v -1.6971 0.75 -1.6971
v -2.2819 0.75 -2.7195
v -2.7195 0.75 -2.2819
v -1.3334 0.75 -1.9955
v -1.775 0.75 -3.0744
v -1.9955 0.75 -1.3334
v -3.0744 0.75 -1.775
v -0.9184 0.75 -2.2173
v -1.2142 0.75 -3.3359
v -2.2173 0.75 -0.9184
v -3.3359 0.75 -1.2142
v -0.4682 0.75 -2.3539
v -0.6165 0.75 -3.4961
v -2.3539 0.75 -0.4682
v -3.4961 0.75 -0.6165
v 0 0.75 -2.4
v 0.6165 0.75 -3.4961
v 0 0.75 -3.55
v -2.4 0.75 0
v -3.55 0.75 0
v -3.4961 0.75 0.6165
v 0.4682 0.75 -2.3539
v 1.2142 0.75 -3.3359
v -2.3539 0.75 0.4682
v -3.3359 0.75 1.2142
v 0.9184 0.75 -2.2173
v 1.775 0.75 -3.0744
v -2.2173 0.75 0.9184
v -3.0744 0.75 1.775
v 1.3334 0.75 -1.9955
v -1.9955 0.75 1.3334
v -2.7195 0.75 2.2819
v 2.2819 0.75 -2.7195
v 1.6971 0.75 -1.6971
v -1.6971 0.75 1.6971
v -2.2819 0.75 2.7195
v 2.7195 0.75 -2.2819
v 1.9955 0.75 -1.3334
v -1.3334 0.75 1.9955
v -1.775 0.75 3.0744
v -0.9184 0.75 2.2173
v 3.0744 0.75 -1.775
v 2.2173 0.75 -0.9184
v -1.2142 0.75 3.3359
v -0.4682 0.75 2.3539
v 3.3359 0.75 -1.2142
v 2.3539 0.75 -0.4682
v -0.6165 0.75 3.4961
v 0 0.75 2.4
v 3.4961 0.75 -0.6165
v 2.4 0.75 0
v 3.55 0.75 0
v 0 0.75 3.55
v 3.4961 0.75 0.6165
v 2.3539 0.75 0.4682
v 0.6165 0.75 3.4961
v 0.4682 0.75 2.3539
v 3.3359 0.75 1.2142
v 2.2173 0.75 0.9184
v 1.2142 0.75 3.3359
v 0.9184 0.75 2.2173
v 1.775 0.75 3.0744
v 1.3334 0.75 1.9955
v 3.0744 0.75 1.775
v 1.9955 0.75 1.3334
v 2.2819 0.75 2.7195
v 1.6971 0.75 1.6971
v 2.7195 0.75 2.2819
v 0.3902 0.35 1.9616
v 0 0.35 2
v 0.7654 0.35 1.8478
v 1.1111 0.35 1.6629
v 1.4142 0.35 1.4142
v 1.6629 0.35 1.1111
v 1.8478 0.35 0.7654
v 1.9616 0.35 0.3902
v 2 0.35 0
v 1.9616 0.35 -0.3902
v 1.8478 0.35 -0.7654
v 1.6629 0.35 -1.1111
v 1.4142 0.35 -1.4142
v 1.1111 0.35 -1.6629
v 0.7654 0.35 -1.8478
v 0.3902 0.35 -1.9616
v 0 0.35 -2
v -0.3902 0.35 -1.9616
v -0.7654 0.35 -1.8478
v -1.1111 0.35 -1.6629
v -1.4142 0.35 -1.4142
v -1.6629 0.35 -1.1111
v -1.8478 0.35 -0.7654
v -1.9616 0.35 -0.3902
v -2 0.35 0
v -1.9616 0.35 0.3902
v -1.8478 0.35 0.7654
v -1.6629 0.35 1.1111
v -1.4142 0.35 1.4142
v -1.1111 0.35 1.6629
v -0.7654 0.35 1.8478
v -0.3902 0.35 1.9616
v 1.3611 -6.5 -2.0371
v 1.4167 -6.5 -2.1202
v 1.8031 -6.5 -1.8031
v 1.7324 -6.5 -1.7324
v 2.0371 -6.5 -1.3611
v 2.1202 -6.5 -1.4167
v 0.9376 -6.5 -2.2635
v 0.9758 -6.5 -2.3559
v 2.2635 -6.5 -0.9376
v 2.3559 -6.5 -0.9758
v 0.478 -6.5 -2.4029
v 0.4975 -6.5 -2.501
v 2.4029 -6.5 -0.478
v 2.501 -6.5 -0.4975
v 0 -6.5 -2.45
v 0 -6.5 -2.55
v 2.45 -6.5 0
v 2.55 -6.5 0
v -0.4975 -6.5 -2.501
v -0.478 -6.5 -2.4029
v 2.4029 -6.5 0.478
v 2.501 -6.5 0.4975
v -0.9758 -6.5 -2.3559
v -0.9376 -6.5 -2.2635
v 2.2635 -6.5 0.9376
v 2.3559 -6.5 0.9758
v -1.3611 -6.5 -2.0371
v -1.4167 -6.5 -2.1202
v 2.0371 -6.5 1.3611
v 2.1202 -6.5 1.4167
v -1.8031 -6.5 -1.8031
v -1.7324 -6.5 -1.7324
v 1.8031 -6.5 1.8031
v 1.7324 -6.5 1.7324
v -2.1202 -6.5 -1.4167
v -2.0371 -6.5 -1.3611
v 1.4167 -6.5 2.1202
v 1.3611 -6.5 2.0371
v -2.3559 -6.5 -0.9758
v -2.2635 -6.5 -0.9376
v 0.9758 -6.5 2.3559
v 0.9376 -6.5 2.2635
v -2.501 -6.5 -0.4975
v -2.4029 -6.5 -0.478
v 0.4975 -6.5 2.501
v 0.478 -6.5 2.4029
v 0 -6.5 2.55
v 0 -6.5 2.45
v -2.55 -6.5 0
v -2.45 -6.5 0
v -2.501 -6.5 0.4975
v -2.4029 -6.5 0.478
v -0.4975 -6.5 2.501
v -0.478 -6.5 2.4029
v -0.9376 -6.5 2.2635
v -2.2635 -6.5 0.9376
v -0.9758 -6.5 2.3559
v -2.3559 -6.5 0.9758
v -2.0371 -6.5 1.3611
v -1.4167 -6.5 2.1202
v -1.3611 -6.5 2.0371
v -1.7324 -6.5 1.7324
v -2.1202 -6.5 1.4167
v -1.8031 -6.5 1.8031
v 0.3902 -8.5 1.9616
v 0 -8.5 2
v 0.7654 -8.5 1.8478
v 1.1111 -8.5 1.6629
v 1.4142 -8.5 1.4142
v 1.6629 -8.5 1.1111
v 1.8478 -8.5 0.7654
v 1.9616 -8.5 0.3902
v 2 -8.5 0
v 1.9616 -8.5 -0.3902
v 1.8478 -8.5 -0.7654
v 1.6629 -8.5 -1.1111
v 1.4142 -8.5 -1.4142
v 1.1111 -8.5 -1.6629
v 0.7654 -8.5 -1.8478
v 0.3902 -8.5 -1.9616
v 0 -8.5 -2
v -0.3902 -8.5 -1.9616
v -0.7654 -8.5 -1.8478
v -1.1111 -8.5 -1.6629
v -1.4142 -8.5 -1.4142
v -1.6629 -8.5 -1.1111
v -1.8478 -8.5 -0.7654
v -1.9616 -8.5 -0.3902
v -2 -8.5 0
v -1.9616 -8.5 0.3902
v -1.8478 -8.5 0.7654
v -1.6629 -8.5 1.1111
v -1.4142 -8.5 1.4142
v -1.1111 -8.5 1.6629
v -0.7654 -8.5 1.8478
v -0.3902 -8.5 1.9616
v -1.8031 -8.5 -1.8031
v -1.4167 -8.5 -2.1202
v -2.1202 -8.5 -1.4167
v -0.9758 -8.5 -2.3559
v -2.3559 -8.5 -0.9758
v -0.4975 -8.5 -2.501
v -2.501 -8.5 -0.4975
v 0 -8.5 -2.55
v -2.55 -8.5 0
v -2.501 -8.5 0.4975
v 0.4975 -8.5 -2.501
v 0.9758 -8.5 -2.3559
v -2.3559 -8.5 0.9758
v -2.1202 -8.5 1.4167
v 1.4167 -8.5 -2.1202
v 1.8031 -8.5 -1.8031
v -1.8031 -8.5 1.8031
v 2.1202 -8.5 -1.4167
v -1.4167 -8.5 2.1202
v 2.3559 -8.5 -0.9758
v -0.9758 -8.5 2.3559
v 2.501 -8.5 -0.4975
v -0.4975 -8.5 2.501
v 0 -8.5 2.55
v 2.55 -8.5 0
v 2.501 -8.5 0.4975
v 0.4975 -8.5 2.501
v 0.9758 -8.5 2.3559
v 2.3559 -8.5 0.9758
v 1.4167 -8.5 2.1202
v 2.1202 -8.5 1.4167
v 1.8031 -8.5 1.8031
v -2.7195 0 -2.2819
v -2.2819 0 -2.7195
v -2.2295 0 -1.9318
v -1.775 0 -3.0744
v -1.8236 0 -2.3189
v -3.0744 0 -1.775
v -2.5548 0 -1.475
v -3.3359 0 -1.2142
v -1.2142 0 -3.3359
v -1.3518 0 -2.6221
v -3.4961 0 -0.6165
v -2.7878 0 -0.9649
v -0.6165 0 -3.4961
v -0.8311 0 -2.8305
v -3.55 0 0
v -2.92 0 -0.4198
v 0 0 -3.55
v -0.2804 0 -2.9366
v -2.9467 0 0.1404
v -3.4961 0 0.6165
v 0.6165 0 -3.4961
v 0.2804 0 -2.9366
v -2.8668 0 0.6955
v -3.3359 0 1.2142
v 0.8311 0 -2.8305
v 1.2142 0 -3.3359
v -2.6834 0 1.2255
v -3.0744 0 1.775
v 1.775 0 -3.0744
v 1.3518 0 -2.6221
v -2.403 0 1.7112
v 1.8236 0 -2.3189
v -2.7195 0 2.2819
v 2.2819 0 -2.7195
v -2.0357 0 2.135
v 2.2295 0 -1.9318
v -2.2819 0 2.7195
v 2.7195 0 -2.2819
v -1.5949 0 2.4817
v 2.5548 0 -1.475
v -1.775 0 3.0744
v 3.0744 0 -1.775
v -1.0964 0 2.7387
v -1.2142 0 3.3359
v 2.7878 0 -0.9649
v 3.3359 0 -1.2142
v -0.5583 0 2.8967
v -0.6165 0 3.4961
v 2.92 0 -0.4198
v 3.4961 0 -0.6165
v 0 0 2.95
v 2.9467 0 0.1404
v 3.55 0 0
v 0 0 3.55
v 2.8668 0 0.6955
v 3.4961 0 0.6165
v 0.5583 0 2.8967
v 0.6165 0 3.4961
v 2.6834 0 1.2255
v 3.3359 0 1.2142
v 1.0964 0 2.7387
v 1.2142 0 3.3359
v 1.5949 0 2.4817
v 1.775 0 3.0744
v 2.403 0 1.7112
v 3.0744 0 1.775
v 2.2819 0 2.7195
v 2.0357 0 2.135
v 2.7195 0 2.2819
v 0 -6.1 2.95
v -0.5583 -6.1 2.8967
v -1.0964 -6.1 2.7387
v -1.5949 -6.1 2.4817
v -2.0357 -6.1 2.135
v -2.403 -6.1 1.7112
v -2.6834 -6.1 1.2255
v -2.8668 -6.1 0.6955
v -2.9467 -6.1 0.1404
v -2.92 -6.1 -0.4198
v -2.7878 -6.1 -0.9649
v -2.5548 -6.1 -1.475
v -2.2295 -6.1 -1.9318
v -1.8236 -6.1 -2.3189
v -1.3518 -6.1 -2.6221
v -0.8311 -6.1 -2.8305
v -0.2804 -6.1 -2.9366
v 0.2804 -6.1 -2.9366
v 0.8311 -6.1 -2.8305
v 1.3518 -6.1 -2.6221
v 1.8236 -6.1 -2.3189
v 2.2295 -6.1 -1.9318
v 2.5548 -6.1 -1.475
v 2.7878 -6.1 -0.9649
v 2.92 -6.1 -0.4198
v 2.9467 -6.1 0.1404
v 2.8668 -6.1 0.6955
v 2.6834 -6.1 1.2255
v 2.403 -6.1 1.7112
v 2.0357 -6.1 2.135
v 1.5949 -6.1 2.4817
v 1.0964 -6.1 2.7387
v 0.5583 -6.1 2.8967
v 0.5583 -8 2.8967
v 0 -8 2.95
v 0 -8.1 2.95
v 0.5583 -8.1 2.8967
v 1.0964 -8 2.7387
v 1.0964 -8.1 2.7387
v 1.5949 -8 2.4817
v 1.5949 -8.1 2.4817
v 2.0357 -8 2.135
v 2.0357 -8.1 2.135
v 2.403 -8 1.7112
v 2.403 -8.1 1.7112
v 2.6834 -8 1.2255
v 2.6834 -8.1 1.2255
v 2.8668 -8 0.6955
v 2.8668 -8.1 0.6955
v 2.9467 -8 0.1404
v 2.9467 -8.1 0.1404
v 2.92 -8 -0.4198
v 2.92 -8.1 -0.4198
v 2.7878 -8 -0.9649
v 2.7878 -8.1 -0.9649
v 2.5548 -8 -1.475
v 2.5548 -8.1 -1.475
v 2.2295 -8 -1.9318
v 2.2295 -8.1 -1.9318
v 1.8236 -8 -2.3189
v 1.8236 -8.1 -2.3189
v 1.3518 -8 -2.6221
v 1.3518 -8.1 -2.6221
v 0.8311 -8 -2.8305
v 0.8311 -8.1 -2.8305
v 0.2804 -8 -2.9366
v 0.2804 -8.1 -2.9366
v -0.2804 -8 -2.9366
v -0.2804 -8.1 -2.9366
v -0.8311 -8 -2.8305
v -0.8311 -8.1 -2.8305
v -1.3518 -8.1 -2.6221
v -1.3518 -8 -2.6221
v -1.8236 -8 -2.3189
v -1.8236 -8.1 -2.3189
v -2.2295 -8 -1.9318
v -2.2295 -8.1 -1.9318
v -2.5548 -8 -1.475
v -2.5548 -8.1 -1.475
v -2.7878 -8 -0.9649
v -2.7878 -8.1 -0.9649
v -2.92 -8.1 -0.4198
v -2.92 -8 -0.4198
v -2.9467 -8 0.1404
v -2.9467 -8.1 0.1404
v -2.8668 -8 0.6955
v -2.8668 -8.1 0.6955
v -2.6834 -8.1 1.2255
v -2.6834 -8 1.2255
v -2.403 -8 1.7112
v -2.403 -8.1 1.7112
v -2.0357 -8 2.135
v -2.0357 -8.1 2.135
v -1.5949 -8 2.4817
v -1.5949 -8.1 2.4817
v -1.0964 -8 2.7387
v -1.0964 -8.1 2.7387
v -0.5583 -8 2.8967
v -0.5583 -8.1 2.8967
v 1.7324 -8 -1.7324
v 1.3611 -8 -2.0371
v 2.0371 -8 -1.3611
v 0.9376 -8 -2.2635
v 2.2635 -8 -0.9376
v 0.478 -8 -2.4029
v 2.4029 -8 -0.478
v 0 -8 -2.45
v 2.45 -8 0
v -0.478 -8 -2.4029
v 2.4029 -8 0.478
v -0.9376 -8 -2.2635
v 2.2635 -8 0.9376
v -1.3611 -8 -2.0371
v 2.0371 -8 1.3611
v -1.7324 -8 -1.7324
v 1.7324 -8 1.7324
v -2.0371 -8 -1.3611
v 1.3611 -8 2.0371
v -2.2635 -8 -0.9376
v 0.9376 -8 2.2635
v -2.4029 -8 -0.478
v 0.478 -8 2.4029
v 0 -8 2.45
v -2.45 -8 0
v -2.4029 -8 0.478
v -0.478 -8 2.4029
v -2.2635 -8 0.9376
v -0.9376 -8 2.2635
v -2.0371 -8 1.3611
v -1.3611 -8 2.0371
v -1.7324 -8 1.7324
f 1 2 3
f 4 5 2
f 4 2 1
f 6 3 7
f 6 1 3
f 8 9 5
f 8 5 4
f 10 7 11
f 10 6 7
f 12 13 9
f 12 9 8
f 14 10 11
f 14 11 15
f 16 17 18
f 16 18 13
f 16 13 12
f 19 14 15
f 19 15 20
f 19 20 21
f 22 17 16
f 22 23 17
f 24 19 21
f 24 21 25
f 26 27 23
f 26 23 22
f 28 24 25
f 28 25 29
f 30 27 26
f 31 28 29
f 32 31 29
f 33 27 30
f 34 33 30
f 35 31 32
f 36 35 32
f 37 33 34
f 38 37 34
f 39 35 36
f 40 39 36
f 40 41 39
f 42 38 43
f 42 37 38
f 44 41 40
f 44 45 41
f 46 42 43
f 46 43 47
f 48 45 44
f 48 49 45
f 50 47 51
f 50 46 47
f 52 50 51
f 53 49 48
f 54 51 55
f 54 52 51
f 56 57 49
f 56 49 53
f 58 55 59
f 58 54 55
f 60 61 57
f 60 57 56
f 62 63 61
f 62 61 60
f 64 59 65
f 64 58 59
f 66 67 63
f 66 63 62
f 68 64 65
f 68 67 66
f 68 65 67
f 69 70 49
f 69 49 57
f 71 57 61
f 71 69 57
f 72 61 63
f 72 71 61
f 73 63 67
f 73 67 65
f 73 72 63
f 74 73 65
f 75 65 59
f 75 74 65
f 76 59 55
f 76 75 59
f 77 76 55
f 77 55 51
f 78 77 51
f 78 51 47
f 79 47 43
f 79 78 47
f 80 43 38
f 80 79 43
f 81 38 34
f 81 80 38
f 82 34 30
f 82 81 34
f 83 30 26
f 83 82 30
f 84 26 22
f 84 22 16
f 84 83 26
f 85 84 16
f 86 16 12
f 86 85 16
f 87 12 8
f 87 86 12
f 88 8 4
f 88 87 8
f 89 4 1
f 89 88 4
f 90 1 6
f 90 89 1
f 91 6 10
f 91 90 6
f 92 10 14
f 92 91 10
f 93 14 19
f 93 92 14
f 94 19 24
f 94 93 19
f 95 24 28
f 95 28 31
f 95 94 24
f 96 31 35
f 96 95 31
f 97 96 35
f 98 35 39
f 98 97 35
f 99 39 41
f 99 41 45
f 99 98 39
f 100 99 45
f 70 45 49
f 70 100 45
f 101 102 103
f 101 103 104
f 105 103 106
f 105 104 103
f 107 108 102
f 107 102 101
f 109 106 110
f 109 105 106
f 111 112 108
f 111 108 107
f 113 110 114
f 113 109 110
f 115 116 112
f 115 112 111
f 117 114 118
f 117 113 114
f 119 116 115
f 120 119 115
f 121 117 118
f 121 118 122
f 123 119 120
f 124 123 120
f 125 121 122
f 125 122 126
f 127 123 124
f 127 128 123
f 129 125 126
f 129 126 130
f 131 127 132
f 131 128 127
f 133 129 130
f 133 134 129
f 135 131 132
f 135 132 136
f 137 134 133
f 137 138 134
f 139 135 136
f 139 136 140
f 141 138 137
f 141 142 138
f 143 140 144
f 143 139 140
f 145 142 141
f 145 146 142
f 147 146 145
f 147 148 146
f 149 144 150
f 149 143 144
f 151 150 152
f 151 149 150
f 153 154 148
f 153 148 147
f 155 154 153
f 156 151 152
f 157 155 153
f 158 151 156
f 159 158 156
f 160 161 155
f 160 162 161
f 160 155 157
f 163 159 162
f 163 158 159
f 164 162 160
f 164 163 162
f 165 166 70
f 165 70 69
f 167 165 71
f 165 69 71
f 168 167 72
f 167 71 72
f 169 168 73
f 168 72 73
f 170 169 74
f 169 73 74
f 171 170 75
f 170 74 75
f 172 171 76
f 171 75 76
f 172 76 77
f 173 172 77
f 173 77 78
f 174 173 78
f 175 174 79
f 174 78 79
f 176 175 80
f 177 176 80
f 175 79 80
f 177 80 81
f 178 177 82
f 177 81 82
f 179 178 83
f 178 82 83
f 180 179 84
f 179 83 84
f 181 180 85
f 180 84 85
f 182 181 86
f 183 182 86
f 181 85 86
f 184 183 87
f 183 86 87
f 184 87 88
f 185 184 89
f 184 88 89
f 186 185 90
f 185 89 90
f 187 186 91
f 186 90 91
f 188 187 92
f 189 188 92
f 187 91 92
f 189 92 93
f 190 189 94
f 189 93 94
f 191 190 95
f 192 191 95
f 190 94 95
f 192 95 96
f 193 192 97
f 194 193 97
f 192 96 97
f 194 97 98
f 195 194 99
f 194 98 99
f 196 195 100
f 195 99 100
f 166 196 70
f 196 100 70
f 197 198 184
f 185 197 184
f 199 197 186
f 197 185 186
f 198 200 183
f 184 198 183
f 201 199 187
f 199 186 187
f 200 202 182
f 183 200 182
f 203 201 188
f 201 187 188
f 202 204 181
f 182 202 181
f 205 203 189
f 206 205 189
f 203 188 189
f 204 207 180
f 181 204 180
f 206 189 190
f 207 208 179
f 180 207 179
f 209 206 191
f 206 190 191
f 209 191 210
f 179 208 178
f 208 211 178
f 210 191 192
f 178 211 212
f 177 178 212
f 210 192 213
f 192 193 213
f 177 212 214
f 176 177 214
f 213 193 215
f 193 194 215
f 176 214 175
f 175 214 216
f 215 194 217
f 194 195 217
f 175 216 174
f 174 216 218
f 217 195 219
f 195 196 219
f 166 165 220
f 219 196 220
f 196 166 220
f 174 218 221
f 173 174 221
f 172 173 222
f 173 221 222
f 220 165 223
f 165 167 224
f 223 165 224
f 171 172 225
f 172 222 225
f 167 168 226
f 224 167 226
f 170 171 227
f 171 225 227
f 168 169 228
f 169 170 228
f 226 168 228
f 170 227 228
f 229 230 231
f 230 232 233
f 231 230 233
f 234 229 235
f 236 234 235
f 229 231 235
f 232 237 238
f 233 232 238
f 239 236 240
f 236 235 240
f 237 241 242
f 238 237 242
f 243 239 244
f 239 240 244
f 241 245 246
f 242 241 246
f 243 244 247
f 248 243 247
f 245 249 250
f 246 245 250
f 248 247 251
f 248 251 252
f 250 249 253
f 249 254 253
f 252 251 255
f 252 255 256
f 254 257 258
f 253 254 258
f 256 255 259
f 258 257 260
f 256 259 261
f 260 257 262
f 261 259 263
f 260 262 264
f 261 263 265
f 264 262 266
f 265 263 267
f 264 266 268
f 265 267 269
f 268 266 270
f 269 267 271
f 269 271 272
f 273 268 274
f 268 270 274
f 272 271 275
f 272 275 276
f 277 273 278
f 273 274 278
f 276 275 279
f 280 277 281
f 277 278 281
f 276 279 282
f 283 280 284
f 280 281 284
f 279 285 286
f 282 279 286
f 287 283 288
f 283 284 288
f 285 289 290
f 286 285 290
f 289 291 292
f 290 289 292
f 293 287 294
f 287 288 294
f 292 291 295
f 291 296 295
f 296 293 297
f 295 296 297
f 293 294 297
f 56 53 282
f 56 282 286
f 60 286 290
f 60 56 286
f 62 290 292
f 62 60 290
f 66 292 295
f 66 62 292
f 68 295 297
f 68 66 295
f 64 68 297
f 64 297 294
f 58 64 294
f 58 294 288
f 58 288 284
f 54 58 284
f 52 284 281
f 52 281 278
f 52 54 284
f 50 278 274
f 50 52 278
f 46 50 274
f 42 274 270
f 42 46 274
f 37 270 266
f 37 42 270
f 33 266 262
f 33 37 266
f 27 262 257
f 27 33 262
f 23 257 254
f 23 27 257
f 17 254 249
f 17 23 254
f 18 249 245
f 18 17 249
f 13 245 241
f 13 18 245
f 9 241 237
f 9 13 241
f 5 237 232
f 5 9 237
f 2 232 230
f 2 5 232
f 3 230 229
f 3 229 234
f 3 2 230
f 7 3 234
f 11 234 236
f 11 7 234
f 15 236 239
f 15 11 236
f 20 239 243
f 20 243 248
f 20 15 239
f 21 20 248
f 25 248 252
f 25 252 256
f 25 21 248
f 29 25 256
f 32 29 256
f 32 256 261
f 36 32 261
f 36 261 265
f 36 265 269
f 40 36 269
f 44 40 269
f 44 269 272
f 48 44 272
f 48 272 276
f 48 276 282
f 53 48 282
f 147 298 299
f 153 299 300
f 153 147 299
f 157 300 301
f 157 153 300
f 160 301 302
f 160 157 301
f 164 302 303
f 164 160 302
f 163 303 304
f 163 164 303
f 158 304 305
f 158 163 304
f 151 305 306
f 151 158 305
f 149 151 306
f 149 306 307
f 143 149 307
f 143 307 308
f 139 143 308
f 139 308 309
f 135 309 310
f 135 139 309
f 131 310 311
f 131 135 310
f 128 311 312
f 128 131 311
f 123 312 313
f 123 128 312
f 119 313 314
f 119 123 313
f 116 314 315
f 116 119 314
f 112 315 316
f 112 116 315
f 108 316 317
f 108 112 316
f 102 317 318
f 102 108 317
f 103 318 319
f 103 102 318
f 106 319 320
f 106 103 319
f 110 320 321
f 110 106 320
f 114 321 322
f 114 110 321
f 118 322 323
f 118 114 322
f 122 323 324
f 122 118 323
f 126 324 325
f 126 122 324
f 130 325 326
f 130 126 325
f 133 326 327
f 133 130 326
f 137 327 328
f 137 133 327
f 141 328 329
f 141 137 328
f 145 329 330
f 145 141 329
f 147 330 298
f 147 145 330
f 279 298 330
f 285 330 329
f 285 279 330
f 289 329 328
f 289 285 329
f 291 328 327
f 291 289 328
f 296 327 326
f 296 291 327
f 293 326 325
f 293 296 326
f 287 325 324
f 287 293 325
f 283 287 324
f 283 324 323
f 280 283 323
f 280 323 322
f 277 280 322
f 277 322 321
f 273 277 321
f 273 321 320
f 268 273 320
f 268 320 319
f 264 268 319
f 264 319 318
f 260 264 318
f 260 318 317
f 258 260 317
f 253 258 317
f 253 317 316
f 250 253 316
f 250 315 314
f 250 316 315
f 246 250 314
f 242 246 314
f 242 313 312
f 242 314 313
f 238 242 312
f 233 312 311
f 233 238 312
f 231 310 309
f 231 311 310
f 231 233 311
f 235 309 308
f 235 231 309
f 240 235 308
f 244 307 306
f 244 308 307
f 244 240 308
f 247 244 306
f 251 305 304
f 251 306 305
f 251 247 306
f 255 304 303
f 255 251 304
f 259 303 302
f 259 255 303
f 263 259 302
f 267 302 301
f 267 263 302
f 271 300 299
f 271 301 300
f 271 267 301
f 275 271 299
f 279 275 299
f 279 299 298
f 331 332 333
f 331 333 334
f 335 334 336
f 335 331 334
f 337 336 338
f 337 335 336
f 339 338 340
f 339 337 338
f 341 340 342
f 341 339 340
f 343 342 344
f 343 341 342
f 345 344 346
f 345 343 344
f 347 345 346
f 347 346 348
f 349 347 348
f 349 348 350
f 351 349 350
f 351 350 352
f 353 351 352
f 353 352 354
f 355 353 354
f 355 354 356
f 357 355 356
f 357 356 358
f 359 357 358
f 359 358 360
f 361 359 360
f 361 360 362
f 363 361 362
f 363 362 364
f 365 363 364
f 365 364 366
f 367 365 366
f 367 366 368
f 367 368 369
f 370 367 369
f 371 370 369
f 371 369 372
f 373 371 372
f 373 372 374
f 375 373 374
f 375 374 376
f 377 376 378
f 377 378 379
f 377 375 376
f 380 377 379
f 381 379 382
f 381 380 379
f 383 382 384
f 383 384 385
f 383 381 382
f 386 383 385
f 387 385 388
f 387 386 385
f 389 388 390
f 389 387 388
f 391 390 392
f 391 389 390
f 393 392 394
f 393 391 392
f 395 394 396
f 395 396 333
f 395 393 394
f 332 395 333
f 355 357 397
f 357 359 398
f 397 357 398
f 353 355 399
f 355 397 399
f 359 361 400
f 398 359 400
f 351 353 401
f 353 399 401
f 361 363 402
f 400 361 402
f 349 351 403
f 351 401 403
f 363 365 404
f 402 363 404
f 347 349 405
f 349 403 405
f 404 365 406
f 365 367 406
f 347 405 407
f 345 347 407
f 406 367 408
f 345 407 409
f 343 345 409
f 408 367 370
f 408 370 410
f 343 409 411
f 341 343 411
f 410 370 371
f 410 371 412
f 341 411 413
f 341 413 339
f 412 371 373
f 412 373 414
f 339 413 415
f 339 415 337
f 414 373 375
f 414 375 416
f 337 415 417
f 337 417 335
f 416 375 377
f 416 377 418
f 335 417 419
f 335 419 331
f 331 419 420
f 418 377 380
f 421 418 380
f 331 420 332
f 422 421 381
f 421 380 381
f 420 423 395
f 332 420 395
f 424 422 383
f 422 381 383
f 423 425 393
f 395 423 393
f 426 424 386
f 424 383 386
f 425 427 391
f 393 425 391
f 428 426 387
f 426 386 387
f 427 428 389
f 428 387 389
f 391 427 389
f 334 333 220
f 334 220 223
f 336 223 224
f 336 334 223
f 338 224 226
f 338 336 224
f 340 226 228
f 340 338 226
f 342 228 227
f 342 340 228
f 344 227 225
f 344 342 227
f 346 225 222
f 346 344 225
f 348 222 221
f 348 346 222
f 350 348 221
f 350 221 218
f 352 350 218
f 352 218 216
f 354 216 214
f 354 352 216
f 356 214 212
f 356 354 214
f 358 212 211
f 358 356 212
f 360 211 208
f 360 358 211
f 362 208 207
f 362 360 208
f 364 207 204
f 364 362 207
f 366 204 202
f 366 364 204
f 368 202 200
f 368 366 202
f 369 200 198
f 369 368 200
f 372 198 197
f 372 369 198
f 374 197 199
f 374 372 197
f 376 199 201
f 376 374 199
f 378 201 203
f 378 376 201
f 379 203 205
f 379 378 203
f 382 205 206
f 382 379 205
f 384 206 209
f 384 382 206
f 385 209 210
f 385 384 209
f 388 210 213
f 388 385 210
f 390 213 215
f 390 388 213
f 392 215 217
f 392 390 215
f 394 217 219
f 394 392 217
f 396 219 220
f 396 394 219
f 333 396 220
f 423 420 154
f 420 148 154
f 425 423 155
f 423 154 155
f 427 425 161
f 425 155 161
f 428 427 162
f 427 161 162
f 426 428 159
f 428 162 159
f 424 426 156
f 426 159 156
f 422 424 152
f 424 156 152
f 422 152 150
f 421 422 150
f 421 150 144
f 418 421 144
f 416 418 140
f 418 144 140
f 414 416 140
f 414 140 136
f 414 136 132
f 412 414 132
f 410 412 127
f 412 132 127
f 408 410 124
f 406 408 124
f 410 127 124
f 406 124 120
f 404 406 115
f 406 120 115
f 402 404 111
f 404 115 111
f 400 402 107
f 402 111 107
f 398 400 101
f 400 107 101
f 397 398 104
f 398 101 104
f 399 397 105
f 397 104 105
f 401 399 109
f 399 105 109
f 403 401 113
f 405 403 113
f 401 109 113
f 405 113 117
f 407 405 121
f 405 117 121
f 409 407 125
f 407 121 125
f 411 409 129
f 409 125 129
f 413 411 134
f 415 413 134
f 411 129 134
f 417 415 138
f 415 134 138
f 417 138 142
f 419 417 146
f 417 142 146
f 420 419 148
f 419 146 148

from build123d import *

# Parameters (mm, degrees)
SKETCH_1_R      = 2.95
SKETCH_1_R_2    = 2
EXTRUDE_1_DEPTH = 8.5
EXTRUDE_START   = 0.75
SKETCH_2_R      = 3.55
SKETCH_2_R_2    = 2
EXTRUDE_2_DEPTH = 0.75
SKETCH_3_W      = 0.5
SKETCH_3_H      = 1.5
CHAMFER_1_SIZE  = 0.4


with BuildPart() as part:
    # 草图1 → 凸台-拉伸1 (new body)
    with BuildSketch(Plane(origin=(0, 0, 0), x_dir=(1, 0, 0), z_dir=(0, 1, 0))):
        with Locations(Location((0, 0, 0), (0, 0, 270))):
            Circle(SKETCH_1_R)
        with Locations(Location((0, 0, 0), (0, 0, 270))):
            Circle(SKETCH_1_R_2, mode=Mode.SUBTRACT)
    extrude(amount=-EXTRUDE_1_DEPTH)

    # 草图2 → 凸台-拉伸2 (add)
    with BuildSketch(Plane(origin=(0, 0, 0), x_dir=(1, 0, 0), z_dir=(0, 1, 0)).offset(EXTRUDE_START)):
        with Locations(Location((0, 0, 0), (0, 0, 270))):
            Circle(SKETCH_2_R)
        with Locations(Location((0, 0, 0), (0, 0, 270))):
            Circle(SKETCH_2_R_2, mode=Mode.SUBTRACT)
    extrude(amount=-EXTRUDE_2_DEPTH)

    # 草图3 → 切除-旋转1 (revolve, cut)
    with BuildSketch(Plane(origin=(0, 0, 0), x_dir=(0, 0, -1), z_dir=(1, 0, 0))):
        with Locations((-2.7, -7.25)):
            Rectangle(SKETCH_3_W, SKETCH_3_H)
    revolve(axis=Axis((0, 0, 0), (0, -1, 0)), mode=Mode.SUBTRACT)

    # 倒角1
    chamfer_1_edges = [part.edges().sort_by_distance(p)[0] for p in [
        (0, 0.75, -2),
        (0, -6.5, -2.95),
        (0, -8.5, -2.95),
    ]]
    chamfer(chamfer_1_edges, length=CHAMFER_1_SIZE)


solid = part.part
